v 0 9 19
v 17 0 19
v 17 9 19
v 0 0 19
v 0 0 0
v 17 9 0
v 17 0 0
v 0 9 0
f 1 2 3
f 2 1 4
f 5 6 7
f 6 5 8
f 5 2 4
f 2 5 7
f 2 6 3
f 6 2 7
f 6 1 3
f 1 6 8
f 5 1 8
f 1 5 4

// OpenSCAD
// Generated by SolidPython 1.0.1 on 2020-07-29 00:46:56


cube(size = [17, 9, 19]);
/***********************************************
*********      SolidPython code:      **********
************************************************
 
# import packages: SolidPython
from solid import *
from solid.utils import *
from itertools import chain, combinations, permutations


class Resize:

    def __init__(self, scad_file):
        self.scad_file = scad_file
        #self.scad_file = import_scad(scad_file)
        # cone/cylinder param:
        self.r1 = 0
        self.r2 = 0
        self.h = 0
        # rectangular prism param:
        self.w = 0
        self.l = 0
        # ellipse param:
        self.r = 0

    # import OpenScad code (file name corresponds to shape)


    # classify shape + parameters
    def assign(self, param1, param2, param3):
        if self.scad_file == 'cone.scad':
            self.r1 = param1
            self.r2 = param2
            self.h = param3
        elif self.scad_file == 'cylinder.scad':
            self.r1 = param1
            self.r2 = param2
            self.h = param3
        elif self.scad_file == 'rectangularPrism.scad':
            self.h = param1
            self.l = param2
            self.w = param3
        else:
            self.r = param1
            self.h = param2

    # resize parameters
    def iterate(self):
        x = range(3, 20, 2)
        i = 1
        if self.scad_file == 'cone.scad':
            tempList = list(permutations(x, 2))
            for temp in tempList:
                param1 = temp[0]
                param2 = temp[1]
                filepath = 'produced_scad_files/' + 'cone' + str(param1) + '_' + str(param2) + '_' + '.scad'
                scad_render_to_file(cylinder(h=param1, r1=param2, r2=0), filepath)

        elif self.scad_file == 'cylinder.scad':
            tempList = list(permutations(x, 3))
            for temp in tempList:
                param1 = temp[0]
                param2 = temp[1]
                filepath = 'produced_scad_files/' + 'cylinder' + str(param1) + '_' + str(param2) + '_' + '.scad'
                scad_render_to_file(cylinder(h=param1, r1=param2, r2=param2), filepath)

        elif self.scad_file == 'rectangularPrism.scad':
            tempList = list(permutations(x, 3))
            for temp in tempList:
                param1 = temp[0]
                param2 = temp[1]
                param3 = temp[2]
                filepath = 'produced_scad_files/' + 'rectangularPrism' + str(param1) + '_' + str(param2) + '_' + str(
                    param3) + '.scad'
                scad_render_to_file(cube(size=(param1, param2, param3)), filepath)

        elif self.scad_file == 'ellipse.scad':
            tempList = list(permutations(x, 4))
            for temp in tempList:
                param1 = temp[0]
                param2 = temp[1]
                param3 = temp[2]
                param4 = temp[3]
                filepath = 'produced_scad_files/' + 'ellipse' + str(param1) + '_' + str(param2) + '_' + str(param3) + '_' + str(param4) + '.scad'
                scad_render_to_file(scale([param1, param2, param3])(sphere(r=param4)), filepath)

    def render_to_scadfile(self):
        scad_render_to_file(scad, 'example.scad') 
 
************************************************/
